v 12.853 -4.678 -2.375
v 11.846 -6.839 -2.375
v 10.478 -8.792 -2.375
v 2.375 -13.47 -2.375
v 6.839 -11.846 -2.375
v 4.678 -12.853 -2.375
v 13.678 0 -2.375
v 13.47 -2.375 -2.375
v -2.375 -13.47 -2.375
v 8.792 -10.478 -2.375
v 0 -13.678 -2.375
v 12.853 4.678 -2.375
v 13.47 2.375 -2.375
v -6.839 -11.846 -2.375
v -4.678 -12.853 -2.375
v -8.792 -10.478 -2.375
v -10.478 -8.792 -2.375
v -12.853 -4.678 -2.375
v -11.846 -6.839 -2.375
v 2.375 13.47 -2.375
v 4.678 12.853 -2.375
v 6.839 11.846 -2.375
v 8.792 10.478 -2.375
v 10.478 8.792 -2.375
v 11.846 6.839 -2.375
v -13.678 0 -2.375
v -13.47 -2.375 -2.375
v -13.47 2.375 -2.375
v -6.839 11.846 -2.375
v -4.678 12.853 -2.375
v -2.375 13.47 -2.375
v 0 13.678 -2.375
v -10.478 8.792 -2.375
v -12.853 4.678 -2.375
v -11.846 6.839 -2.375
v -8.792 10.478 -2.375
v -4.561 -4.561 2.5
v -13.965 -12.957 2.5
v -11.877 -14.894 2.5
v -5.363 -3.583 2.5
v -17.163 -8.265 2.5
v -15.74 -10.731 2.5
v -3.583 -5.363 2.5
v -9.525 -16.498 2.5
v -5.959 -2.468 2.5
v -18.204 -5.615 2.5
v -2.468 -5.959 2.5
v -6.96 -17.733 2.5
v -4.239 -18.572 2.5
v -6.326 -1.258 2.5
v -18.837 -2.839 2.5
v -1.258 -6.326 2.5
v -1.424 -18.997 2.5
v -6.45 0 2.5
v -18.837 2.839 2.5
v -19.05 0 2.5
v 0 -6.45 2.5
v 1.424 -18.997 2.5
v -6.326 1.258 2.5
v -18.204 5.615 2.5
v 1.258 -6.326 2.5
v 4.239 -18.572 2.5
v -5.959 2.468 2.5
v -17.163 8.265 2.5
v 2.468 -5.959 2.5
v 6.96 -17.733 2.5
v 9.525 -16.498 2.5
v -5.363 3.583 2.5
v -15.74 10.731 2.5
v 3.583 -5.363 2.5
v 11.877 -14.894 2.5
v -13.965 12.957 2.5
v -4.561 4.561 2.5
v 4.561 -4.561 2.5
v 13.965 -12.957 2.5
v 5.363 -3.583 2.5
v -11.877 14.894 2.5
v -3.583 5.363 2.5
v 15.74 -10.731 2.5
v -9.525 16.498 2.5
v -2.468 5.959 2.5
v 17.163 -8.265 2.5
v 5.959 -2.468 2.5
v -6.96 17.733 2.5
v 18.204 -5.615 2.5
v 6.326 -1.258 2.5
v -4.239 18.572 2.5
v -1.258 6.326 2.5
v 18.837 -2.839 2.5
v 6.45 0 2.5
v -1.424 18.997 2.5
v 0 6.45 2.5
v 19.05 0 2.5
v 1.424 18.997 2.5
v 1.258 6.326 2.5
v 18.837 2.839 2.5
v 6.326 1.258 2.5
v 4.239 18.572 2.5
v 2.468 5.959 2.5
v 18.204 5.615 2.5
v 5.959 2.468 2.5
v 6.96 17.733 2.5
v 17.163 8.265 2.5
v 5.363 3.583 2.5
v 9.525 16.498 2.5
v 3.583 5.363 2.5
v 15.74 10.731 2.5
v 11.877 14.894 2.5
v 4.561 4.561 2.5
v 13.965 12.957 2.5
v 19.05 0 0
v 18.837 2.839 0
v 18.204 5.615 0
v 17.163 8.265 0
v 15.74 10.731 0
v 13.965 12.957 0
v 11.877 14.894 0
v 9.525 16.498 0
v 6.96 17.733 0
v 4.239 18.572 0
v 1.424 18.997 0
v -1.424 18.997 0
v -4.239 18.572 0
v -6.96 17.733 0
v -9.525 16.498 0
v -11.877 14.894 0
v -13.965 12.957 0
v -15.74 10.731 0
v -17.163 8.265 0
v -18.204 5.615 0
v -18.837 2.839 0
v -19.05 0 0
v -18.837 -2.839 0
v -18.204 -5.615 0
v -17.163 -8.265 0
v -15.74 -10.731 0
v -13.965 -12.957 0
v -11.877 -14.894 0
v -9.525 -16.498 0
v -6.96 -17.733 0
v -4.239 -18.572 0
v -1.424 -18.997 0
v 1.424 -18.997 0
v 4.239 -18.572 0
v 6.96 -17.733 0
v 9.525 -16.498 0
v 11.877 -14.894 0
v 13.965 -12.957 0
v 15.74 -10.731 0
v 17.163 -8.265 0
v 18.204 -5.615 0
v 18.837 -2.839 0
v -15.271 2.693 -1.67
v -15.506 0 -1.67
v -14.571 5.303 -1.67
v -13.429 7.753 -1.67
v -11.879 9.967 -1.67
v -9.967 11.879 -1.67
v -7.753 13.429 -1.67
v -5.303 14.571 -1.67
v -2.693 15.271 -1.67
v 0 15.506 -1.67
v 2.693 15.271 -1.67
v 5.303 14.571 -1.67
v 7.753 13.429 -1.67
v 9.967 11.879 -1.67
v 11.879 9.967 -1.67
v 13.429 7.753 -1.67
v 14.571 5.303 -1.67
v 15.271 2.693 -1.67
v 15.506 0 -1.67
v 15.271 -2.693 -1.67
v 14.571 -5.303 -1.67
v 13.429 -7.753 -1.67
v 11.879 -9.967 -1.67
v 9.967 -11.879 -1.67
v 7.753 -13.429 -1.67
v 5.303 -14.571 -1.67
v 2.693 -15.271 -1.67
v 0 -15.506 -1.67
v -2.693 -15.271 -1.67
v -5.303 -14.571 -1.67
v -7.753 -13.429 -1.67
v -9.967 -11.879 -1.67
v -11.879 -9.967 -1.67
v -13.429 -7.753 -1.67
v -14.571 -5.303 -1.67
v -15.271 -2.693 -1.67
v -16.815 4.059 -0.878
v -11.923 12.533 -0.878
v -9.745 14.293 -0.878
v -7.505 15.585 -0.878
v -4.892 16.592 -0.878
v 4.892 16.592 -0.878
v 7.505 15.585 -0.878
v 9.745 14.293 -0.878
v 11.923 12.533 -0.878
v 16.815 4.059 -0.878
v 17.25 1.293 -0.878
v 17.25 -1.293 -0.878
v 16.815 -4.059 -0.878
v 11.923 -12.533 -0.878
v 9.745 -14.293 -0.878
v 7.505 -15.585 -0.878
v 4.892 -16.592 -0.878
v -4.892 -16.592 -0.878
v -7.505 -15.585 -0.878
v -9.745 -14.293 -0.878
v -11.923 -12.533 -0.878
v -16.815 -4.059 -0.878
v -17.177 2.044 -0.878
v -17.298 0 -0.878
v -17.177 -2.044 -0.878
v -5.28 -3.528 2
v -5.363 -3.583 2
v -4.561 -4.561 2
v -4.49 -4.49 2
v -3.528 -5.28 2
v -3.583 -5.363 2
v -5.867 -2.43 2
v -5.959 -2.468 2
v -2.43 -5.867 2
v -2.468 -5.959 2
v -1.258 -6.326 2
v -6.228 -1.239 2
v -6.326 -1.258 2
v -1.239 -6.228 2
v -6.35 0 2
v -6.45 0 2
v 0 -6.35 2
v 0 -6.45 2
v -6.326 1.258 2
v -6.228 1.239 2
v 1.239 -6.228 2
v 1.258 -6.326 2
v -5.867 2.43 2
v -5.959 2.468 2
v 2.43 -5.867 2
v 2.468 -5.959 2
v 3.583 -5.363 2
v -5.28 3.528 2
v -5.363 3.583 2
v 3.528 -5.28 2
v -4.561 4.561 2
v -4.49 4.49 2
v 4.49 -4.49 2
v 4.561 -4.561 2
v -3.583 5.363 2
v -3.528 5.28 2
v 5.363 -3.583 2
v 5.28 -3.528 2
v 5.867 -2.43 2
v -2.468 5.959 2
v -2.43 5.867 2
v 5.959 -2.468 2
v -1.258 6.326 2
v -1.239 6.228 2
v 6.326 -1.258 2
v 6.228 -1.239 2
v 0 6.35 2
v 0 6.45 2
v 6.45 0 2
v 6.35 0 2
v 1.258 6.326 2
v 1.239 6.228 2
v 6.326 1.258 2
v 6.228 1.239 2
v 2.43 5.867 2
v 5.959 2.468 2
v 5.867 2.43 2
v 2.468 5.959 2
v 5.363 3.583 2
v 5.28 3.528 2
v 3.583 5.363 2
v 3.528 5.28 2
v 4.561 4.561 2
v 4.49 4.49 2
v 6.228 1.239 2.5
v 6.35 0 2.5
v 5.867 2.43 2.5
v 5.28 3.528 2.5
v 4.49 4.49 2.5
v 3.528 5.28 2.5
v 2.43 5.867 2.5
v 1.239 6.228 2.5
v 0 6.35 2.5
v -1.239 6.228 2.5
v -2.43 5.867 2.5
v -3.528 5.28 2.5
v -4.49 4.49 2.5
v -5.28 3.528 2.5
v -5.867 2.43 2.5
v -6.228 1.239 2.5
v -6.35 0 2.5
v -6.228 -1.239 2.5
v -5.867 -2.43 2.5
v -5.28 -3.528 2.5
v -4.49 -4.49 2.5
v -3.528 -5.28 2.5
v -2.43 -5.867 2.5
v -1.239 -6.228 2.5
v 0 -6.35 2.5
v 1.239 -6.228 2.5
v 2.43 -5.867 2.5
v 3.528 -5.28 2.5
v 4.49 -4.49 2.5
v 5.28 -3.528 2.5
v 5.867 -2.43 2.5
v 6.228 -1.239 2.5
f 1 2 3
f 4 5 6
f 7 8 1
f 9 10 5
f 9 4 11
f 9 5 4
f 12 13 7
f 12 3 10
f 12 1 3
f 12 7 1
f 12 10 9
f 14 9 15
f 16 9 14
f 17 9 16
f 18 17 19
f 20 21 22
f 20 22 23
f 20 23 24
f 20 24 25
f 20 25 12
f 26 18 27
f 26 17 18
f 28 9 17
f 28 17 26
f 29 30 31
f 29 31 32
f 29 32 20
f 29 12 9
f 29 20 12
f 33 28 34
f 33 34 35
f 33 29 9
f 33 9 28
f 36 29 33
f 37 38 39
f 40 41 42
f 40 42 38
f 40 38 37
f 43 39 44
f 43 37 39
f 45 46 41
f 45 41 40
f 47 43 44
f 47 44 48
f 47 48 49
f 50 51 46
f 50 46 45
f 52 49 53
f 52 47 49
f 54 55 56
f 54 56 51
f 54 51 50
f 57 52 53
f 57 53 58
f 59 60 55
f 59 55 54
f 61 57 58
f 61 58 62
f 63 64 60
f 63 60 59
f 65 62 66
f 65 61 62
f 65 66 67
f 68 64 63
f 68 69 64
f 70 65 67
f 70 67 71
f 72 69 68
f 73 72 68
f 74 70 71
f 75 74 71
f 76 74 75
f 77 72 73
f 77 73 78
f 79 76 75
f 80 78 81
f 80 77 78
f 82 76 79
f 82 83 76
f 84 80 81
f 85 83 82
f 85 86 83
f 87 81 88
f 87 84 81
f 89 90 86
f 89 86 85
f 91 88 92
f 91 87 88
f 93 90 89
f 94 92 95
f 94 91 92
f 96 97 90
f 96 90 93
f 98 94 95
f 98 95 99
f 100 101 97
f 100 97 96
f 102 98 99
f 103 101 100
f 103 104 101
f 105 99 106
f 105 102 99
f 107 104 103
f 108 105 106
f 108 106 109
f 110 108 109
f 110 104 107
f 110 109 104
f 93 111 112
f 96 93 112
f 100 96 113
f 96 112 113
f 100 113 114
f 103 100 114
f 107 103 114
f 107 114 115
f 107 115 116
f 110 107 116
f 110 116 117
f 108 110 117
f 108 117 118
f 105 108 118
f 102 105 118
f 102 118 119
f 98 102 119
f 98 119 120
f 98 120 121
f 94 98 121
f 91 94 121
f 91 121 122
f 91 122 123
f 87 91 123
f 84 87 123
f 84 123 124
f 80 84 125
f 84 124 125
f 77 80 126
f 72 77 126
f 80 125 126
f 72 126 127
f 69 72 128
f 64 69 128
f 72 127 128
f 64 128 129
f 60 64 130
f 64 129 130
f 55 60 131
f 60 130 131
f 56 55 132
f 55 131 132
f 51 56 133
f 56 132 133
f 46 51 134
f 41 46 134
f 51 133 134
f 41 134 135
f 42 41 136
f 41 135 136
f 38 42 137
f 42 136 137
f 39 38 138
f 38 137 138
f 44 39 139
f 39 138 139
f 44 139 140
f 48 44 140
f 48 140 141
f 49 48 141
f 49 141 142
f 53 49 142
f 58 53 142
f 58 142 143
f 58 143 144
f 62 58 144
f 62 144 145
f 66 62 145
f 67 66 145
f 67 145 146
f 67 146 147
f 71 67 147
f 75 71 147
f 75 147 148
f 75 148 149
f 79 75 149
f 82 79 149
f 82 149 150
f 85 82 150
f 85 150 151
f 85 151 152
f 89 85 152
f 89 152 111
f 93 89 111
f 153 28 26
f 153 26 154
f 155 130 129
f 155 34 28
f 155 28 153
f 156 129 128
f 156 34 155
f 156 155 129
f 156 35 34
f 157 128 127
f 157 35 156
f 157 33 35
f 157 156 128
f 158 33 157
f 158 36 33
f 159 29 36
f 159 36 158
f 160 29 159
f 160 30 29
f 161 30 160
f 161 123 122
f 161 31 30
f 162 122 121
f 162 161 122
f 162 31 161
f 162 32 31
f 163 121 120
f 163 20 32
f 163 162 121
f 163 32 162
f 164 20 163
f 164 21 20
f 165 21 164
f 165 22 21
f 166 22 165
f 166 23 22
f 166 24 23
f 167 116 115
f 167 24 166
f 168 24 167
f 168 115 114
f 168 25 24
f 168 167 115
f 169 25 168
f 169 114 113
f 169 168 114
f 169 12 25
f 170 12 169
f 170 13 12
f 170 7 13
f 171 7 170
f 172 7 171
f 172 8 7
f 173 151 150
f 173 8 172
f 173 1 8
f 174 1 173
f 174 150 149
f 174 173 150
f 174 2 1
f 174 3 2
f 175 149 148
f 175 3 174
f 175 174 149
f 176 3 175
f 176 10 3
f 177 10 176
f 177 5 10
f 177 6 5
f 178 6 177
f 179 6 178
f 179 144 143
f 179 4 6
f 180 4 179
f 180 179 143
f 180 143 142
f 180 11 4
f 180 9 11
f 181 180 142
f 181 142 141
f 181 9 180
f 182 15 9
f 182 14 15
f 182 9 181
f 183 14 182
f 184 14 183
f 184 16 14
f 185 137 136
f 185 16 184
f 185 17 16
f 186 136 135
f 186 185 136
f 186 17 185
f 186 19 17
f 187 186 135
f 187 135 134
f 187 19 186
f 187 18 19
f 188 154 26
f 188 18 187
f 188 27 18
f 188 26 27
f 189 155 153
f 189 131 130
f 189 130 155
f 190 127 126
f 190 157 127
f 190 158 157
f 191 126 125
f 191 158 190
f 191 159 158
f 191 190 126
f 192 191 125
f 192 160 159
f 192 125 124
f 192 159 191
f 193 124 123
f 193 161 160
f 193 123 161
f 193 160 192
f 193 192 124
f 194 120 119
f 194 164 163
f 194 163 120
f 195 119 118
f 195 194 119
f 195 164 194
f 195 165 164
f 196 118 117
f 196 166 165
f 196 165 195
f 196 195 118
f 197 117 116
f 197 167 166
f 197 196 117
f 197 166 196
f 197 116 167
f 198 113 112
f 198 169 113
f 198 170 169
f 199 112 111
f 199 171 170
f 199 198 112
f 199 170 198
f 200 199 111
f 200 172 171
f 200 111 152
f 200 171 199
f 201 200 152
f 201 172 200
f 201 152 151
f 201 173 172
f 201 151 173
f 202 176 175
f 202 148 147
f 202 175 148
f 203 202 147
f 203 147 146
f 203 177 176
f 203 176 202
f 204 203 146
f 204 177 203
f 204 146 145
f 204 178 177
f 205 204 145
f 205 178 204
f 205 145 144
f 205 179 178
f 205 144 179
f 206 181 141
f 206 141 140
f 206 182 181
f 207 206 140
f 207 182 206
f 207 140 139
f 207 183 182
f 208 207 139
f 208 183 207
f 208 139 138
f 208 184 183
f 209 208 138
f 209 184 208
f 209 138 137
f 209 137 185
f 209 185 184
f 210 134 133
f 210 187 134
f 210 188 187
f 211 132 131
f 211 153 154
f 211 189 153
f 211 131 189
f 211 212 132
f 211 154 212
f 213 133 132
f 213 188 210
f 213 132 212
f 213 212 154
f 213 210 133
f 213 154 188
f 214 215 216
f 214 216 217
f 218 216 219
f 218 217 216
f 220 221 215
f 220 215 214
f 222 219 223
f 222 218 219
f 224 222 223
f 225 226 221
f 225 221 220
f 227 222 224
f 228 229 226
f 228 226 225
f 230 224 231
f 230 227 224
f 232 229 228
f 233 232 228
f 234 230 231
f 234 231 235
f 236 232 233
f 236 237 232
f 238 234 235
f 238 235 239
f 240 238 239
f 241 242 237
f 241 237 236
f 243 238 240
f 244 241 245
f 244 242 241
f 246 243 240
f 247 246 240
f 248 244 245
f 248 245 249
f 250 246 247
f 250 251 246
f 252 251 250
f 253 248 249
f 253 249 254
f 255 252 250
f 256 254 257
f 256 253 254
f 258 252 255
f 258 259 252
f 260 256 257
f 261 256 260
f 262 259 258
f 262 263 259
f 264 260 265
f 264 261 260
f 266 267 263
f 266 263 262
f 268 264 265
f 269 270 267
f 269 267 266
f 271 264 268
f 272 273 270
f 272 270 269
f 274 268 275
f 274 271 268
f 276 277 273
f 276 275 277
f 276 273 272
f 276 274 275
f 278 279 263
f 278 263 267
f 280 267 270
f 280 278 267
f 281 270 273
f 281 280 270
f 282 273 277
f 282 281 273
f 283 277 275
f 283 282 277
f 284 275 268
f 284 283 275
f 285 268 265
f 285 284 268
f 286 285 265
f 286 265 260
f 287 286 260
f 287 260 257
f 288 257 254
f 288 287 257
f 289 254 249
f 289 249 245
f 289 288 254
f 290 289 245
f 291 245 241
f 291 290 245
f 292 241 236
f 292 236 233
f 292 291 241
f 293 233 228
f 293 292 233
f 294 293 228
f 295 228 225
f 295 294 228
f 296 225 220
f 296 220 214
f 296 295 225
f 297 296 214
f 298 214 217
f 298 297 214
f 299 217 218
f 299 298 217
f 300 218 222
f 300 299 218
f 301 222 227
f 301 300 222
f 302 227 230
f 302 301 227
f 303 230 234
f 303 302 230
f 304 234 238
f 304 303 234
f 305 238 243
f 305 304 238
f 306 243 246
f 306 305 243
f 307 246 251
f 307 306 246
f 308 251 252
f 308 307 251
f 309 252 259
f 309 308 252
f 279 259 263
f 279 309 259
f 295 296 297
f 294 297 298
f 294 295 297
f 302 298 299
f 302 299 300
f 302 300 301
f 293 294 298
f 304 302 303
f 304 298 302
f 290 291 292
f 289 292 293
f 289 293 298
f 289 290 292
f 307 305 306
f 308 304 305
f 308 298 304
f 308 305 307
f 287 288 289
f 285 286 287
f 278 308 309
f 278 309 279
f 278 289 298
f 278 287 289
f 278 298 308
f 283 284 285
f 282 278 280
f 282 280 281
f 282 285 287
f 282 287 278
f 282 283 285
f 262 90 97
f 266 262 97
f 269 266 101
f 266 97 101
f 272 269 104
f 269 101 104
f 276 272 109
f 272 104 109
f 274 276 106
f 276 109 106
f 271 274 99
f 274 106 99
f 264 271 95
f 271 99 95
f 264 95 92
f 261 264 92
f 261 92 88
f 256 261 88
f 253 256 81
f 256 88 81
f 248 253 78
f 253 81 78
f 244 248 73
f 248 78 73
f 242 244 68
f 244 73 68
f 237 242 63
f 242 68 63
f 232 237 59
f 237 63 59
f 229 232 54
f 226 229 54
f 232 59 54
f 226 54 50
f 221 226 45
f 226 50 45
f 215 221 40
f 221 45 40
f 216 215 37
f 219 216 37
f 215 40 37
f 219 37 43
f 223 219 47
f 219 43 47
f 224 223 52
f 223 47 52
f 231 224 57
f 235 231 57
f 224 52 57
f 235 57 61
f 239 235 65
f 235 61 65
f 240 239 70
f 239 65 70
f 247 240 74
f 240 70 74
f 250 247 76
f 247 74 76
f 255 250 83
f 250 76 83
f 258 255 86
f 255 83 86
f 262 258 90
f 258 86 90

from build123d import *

# Parameters (mm, degrees)
F0_R     = 19.05
F1_DEPTH = 2.5
F2_R     = 6.45
F2_R_2   = 6.35
F3_DEPTH = 0.5
F4_DEPTH = 0.5


with BuildPart() as f1:
    # F0 (on Top) → F1 (new body)
    with BuildSketch(Plane.XY):
        Circle(F0_R)
    extrude(amount=F1_DEPTH)

    # F2 (on face) → F3 (cut)
    with BuildSketch(Plane.XY.offset(2.5)):
        Circle(F2_R)
        Circle(F2_R_2, mode=Mode.SUBTRACT)
    extrude(amount=-F3_DEPTH, mode=Mode.SUBTRACT)

    # F2 (on face) → F4 (cut)
    with BuildSketch(Plane.XY.offset(2.5)):
        Circle(F2_R)
        Circle(F2_R_2, mode=Mode.SUBTRACT)
    extrude(amount=-F4_DEPTH, mode=Mode.SUBTRACT)

    # F5 (on Front) → F6 (revolve)
    with BuildSketch(Plane.XZ):
        with BuildLine():
            Line((0, -2.375183), (0, 0))
            Line((0, 0), (-19.05, 0))
            ThreePointArc((-19.05, 0), (-16.407129, -1.284926), (-13.678185, -2.375183))
            Line((-13.678185, -2.375183), (0, -2.375183))
        make_face()
    revolve(axis=Axis((0, 0, -1.187592), (0, 0, -1)))


solid = f1.part
